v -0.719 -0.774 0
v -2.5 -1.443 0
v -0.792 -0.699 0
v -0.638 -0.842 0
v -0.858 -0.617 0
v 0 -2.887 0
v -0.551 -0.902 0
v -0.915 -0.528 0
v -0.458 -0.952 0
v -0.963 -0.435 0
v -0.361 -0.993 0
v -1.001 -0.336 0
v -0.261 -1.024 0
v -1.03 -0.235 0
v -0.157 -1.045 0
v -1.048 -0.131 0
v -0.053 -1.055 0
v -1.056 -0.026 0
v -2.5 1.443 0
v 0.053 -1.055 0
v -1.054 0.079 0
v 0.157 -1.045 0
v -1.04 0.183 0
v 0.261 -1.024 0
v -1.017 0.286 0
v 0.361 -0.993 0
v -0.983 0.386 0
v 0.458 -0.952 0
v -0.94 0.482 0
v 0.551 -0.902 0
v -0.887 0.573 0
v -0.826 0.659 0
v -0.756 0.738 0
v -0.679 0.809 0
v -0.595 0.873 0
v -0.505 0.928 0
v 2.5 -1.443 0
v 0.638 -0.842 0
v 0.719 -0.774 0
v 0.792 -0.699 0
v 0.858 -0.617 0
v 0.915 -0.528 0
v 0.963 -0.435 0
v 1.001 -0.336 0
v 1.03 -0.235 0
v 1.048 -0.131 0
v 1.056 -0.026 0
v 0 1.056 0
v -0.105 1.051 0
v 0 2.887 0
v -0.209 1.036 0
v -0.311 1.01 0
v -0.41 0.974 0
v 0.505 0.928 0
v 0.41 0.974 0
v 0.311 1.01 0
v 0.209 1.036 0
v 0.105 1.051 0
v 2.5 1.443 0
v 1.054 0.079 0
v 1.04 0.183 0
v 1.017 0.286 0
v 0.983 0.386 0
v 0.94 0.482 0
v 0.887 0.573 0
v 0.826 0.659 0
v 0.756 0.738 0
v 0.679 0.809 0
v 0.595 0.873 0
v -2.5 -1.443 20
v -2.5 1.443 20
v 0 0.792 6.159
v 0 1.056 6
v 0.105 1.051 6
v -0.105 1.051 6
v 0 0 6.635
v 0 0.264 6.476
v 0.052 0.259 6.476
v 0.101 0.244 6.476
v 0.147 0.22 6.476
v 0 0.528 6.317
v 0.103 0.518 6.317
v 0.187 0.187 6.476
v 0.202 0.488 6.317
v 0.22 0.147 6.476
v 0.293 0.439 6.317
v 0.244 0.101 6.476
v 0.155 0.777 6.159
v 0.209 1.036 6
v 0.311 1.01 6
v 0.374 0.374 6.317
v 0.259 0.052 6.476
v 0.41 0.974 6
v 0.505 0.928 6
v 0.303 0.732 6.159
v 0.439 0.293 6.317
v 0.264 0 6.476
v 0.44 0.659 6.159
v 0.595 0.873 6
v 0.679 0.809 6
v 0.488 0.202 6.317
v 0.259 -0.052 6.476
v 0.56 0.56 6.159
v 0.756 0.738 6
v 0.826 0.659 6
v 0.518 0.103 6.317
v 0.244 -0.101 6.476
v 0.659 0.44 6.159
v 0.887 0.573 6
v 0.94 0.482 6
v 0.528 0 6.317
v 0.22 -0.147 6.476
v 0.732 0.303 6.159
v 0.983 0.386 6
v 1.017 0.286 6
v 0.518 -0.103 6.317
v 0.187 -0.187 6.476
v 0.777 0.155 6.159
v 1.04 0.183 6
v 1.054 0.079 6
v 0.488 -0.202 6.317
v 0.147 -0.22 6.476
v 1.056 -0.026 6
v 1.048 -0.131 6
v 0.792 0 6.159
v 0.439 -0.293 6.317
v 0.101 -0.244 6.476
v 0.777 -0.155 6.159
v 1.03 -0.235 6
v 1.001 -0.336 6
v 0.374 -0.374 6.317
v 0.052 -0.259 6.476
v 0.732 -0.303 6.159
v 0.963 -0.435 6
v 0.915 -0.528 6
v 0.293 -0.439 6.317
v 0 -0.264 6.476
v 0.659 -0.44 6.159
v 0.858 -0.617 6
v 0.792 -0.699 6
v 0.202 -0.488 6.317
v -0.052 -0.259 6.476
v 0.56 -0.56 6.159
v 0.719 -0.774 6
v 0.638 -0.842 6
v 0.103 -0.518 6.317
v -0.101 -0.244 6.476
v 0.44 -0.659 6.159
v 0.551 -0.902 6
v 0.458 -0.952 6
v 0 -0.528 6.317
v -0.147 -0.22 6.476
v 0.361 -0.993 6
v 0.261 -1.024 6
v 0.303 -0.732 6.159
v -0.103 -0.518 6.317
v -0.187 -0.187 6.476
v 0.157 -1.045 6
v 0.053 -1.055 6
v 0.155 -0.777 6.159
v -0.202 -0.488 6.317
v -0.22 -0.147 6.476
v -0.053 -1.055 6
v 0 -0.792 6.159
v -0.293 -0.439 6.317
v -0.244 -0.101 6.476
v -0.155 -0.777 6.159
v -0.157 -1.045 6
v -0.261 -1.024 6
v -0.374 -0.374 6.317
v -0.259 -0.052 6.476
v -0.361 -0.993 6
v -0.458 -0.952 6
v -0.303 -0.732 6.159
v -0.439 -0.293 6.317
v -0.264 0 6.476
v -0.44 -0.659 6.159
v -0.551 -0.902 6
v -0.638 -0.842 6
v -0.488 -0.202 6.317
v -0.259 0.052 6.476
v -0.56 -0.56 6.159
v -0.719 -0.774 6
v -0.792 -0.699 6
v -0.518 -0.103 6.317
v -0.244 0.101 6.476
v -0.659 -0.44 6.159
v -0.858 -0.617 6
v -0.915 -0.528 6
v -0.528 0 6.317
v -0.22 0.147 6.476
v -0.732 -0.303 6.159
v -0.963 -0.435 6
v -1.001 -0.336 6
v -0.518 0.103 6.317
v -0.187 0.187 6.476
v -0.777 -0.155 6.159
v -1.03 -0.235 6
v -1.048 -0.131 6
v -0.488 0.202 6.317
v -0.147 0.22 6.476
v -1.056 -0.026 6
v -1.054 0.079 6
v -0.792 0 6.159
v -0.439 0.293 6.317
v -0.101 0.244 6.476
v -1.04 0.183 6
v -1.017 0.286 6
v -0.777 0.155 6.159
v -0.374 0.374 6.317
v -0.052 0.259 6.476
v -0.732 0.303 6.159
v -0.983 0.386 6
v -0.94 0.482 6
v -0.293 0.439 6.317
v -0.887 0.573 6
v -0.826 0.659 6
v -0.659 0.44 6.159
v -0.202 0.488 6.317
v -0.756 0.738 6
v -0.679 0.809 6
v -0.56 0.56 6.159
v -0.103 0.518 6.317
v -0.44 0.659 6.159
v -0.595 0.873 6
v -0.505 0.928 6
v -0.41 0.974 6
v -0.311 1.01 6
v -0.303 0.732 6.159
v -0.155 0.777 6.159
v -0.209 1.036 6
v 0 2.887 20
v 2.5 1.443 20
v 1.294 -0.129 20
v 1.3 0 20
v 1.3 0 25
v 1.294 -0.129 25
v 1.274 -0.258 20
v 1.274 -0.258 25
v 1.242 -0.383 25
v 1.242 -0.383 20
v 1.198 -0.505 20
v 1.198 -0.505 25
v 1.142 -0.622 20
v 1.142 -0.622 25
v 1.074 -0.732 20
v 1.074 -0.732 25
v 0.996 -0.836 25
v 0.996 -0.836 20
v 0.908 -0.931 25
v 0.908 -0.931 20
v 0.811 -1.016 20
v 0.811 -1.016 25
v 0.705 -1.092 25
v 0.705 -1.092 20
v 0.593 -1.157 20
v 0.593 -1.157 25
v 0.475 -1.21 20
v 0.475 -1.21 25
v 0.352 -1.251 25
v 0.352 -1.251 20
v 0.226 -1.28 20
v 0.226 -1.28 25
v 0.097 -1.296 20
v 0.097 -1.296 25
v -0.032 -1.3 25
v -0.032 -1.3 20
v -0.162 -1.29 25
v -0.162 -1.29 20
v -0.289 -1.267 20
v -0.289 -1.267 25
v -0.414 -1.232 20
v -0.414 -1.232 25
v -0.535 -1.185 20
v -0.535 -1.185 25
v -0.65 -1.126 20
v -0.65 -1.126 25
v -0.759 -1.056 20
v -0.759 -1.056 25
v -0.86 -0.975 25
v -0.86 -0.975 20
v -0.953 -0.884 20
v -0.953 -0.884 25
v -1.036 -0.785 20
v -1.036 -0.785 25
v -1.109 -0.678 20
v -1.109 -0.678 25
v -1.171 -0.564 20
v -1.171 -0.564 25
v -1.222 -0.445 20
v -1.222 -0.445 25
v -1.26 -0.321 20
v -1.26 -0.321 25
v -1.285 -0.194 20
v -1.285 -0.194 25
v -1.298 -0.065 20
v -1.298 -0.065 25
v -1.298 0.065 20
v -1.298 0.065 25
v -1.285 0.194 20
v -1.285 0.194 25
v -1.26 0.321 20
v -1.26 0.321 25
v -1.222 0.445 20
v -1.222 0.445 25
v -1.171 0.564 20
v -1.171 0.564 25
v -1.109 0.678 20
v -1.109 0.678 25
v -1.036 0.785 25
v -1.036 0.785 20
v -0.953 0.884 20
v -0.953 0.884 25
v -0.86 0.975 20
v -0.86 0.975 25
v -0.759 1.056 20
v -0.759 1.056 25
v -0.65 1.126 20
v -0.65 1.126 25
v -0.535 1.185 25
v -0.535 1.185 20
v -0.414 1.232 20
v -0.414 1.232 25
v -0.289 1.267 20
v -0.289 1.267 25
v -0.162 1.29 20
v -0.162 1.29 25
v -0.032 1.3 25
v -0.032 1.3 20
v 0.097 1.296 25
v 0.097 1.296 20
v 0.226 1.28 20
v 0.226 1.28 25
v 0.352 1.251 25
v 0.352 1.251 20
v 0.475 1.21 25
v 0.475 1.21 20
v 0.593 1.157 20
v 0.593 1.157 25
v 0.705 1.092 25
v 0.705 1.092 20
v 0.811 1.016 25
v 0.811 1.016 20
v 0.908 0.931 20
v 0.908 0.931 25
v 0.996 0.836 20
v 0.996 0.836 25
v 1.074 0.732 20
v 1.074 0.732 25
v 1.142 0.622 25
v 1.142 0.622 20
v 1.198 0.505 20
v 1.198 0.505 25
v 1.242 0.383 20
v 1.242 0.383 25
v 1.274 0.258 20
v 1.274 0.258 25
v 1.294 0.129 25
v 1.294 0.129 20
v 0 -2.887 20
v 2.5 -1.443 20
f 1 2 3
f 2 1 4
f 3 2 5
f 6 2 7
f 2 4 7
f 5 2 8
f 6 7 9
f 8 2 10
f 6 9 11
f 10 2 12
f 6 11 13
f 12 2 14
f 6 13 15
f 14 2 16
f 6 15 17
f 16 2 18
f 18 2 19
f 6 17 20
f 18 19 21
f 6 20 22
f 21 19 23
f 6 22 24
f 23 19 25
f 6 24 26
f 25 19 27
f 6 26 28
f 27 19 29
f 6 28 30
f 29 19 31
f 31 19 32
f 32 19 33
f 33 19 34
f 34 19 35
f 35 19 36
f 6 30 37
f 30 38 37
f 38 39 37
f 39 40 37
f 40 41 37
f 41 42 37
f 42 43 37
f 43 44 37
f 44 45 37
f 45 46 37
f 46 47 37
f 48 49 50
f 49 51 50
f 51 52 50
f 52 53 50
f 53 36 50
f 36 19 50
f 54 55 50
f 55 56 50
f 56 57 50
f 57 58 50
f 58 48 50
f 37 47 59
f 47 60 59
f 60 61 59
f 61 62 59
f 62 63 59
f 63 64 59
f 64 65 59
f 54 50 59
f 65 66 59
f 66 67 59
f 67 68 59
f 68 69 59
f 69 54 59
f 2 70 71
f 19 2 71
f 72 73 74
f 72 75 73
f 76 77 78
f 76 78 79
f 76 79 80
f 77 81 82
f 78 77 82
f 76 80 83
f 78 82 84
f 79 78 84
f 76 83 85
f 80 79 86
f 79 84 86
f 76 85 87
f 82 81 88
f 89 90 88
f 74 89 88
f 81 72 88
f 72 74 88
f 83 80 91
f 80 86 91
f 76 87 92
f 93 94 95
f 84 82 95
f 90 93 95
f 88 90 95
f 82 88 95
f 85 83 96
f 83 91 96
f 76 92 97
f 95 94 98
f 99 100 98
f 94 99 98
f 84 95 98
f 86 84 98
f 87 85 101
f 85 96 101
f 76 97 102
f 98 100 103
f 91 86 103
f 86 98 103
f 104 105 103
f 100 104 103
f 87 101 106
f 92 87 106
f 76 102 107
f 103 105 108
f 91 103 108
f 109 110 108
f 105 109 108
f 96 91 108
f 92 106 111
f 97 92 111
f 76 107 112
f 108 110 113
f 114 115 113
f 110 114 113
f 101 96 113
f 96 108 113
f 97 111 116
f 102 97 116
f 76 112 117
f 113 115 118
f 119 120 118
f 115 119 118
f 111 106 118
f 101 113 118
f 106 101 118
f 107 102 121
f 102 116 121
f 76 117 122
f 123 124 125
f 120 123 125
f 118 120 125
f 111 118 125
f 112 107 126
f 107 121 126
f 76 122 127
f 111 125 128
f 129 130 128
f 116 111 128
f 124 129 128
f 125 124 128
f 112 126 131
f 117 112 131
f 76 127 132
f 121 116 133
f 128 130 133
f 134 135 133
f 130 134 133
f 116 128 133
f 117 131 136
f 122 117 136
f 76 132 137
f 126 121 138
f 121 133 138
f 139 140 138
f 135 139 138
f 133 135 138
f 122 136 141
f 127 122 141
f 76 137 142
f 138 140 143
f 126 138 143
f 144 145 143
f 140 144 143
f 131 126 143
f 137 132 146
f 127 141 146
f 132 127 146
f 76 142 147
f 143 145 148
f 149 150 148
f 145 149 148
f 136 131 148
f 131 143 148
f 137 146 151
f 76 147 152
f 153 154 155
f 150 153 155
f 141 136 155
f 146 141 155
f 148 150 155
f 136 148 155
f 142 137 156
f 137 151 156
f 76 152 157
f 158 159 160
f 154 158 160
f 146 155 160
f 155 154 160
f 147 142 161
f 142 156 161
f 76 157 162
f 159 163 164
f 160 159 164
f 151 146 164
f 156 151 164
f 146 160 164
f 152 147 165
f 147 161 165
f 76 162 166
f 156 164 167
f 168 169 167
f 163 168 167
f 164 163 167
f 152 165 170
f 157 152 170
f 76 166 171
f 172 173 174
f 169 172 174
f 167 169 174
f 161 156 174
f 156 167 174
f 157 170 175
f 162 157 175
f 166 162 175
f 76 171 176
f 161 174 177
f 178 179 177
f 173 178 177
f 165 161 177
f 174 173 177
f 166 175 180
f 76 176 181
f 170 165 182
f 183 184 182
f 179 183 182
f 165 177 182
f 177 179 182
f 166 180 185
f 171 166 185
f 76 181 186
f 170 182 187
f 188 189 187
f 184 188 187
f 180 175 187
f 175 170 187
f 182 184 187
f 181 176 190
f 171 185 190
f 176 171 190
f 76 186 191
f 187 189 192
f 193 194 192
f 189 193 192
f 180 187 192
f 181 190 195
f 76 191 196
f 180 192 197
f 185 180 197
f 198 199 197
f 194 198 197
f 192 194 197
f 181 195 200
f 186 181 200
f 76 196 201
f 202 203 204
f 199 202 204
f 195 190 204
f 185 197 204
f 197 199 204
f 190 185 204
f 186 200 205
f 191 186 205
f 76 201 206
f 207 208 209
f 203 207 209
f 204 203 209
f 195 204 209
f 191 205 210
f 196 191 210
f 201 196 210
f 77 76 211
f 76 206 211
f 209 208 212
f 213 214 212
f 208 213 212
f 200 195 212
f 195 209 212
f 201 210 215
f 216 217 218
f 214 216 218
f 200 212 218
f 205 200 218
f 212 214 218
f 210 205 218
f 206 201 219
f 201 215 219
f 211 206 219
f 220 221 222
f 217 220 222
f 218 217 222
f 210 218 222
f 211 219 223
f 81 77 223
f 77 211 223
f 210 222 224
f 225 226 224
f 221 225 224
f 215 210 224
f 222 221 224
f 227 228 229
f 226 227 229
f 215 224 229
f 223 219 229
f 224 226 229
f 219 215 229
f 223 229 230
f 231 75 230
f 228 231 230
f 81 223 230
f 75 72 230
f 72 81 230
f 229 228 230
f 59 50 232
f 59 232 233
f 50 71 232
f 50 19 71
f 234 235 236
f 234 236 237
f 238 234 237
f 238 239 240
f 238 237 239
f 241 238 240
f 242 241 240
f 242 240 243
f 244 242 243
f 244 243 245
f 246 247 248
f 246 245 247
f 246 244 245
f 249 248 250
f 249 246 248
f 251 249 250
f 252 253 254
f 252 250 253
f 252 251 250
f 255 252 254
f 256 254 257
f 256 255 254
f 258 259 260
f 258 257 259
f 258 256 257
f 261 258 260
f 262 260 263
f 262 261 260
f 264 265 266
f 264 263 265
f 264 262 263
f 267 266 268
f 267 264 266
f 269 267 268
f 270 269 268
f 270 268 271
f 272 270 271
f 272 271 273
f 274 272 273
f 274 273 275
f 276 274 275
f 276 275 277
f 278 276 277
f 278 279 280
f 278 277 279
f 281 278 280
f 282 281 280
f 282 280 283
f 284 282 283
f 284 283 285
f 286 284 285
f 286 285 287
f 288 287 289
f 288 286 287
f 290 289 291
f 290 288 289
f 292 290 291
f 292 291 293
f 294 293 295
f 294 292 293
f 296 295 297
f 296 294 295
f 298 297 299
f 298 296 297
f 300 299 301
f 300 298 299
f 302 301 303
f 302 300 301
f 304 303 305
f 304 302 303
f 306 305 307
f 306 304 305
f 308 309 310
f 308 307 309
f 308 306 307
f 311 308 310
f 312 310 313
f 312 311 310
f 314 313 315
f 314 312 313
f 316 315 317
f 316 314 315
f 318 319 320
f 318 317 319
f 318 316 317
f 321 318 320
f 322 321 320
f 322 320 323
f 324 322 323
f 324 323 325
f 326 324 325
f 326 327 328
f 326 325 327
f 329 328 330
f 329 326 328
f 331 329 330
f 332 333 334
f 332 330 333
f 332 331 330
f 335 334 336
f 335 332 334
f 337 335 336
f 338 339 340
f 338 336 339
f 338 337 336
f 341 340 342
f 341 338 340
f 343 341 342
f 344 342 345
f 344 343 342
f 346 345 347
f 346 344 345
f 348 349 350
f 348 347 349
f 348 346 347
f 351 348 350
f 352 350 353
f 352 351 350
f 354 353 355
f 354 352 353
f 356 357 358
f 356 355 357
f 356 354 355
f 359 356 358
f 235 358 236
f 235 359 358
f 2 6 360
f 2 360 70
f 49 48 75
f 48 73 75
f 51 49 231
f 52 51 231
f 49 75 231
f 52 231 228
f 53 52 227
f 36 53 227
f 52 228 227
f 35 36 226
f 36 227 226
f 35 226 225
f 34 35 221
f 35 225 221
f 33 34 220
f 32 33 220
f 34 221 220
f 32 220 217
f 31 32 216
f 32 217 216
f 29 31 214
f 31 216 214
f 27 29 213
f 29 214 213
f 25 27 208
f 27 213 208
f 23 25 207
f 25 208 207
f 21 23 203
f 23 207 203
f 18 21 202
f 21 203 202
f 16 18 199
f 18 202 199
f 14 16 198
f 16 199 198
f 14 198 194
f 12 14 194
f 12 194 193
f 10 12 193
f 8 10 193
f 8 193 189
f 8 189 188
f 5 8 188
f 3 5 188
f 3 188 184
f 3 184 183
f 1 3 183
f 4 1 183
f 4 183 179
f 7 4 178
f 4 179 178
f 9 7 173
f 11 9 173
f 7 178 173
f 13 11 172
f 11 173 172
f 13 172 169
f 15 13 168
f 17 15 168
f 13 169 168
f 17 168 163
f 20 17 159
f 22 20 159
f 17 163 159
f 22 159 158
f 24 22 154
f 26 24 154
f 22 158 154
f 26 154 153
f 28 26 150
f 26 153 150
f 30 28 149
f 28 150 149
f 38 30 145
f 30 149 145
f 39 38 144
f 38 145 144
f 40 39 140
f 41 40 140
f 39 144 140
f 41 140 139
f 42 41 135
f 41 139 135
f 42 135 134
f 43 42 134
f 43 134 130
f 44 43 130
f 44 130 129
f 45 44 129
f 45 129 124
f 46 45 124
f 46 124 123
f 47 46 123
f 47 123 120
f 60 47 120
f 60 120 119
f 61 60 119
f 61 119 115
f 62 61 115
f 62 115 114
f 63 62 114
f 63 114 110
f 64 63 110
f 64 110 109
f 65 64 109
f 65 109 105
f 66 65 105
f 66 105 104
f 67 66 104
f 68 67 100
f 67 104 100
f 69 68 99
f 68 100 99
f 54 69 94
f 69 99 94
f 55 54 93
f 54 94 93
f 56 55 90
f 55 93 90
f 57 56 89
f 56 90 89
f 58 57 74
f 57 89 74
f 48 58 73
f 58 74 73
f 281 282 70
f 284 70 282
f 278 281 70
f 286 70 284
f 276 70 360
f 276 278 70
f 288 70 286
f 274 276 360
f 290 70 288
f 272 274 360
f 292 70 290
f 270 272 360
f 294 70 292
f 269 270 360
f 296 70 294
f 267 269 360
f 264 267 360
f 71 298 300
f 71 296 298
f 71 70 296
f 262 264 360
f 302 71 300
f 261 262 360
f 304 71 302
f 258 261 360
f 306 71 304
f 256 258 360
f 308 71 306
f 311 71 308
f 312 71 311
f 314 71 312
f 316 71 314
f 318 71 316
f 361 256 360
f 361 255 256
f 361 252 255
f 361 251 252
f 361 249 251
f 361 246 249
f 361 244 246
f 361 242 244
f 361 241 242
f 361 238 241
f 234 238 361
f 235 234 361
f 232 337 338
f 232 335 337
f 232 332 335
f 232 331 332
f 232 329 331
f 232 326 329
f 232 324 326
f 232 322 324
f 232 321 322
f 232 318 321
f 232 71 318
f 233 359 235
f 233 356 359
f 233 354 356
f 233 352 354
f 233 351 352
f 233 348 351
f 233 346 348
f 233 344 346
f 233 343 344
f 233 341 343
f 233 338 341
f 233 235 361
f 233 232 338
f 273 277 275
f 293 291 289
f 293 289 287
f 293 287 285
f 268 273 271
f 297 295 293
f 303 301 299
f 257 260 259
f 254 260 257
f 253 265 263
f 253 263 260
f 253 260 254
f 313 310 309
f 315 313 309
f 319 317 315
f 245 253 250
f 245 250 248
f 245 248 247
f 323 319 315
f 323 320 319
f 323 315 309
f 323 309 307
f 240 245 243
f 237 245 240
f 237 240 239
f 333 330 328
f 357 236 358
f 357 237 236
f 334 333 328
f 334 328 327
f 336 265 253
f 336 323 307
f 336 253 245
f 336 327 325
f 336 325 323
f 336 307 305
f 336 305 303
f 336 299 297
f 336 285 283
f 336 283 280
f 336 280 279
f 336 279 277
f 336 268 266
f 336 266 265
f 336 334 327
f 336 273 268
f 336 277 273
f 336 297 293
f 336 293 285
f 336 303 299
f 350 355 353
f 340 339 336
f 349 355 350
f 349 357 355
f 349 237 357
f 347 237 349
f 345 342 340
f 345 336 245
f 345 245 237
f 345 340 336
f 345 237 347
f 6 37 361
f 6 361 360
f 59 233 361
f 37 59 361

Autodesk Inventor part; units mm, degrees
ref_plane "YZ Plane" through (0, 0, 0) normal (1, 0, 0) x (0, 1, 0)
ref_plane "XZ Plane" through (0, 0, 0) normal (0, 1, 0) x (-1, 0, 0)
ref_plane "XY Plane" through (0, 0, 0) normal (0, 0, 1) x (1, 0, 0)
sketch "スケッチ1" plane through (0, 0, 0) normal (0, 0, 1) x (1, 0, 0)
  line L0 (0, 2.8868) -> (2.5, 1.4434)
  line L1 (2.5, 1.4434) -> (2.5, -1.4434)
  line L2 (2.5, -1.4434) -> (0, -2.8868)
  line L3 (0, -2.8868) -> (-2.5, -1.4434)
  line L4 (-2.5, -1.4434) -> (-2.5, 1.4434)
  line L5 (-2.5, 1.4434) -> (0, 2.8868)
  point P0 (0, 0)
  point P1 (0, 0)
  dimension "d0" = 5
extrude "押し出し1" add sketch "スケッチ1" along normal blind 20
sketch "スケッチ2" plane through (0, 0, 20) normal (0, 0, 1) x (1, 0, 0)
  circle A0 centre (0, 0) radius 1.3
  dimension "d3" = 2.6
extrude "押し出し2" add sketch "スケッチ2" along normal blind 5
thread "ねじ1" size "M2.6x0.45" class "6g" standard "ANSI Metric M Profile" full length
sketch "スケッチ3" plane through (0, 0, 0) normal (0, 0, -1) x (-1, 0, 0)
  point P0 (0, 0)
hole "穴1" at (0, 0, 0) direction (0, 0, 1) diameter 2.113 depth 6 tip angle 118 thread size "M2.6x0.45" class "6H" standard "ISO Metric profile"
properties part number "ジュラコンスペーサー（六角）_BS-2620E" material "アセタール樹脂、白"
